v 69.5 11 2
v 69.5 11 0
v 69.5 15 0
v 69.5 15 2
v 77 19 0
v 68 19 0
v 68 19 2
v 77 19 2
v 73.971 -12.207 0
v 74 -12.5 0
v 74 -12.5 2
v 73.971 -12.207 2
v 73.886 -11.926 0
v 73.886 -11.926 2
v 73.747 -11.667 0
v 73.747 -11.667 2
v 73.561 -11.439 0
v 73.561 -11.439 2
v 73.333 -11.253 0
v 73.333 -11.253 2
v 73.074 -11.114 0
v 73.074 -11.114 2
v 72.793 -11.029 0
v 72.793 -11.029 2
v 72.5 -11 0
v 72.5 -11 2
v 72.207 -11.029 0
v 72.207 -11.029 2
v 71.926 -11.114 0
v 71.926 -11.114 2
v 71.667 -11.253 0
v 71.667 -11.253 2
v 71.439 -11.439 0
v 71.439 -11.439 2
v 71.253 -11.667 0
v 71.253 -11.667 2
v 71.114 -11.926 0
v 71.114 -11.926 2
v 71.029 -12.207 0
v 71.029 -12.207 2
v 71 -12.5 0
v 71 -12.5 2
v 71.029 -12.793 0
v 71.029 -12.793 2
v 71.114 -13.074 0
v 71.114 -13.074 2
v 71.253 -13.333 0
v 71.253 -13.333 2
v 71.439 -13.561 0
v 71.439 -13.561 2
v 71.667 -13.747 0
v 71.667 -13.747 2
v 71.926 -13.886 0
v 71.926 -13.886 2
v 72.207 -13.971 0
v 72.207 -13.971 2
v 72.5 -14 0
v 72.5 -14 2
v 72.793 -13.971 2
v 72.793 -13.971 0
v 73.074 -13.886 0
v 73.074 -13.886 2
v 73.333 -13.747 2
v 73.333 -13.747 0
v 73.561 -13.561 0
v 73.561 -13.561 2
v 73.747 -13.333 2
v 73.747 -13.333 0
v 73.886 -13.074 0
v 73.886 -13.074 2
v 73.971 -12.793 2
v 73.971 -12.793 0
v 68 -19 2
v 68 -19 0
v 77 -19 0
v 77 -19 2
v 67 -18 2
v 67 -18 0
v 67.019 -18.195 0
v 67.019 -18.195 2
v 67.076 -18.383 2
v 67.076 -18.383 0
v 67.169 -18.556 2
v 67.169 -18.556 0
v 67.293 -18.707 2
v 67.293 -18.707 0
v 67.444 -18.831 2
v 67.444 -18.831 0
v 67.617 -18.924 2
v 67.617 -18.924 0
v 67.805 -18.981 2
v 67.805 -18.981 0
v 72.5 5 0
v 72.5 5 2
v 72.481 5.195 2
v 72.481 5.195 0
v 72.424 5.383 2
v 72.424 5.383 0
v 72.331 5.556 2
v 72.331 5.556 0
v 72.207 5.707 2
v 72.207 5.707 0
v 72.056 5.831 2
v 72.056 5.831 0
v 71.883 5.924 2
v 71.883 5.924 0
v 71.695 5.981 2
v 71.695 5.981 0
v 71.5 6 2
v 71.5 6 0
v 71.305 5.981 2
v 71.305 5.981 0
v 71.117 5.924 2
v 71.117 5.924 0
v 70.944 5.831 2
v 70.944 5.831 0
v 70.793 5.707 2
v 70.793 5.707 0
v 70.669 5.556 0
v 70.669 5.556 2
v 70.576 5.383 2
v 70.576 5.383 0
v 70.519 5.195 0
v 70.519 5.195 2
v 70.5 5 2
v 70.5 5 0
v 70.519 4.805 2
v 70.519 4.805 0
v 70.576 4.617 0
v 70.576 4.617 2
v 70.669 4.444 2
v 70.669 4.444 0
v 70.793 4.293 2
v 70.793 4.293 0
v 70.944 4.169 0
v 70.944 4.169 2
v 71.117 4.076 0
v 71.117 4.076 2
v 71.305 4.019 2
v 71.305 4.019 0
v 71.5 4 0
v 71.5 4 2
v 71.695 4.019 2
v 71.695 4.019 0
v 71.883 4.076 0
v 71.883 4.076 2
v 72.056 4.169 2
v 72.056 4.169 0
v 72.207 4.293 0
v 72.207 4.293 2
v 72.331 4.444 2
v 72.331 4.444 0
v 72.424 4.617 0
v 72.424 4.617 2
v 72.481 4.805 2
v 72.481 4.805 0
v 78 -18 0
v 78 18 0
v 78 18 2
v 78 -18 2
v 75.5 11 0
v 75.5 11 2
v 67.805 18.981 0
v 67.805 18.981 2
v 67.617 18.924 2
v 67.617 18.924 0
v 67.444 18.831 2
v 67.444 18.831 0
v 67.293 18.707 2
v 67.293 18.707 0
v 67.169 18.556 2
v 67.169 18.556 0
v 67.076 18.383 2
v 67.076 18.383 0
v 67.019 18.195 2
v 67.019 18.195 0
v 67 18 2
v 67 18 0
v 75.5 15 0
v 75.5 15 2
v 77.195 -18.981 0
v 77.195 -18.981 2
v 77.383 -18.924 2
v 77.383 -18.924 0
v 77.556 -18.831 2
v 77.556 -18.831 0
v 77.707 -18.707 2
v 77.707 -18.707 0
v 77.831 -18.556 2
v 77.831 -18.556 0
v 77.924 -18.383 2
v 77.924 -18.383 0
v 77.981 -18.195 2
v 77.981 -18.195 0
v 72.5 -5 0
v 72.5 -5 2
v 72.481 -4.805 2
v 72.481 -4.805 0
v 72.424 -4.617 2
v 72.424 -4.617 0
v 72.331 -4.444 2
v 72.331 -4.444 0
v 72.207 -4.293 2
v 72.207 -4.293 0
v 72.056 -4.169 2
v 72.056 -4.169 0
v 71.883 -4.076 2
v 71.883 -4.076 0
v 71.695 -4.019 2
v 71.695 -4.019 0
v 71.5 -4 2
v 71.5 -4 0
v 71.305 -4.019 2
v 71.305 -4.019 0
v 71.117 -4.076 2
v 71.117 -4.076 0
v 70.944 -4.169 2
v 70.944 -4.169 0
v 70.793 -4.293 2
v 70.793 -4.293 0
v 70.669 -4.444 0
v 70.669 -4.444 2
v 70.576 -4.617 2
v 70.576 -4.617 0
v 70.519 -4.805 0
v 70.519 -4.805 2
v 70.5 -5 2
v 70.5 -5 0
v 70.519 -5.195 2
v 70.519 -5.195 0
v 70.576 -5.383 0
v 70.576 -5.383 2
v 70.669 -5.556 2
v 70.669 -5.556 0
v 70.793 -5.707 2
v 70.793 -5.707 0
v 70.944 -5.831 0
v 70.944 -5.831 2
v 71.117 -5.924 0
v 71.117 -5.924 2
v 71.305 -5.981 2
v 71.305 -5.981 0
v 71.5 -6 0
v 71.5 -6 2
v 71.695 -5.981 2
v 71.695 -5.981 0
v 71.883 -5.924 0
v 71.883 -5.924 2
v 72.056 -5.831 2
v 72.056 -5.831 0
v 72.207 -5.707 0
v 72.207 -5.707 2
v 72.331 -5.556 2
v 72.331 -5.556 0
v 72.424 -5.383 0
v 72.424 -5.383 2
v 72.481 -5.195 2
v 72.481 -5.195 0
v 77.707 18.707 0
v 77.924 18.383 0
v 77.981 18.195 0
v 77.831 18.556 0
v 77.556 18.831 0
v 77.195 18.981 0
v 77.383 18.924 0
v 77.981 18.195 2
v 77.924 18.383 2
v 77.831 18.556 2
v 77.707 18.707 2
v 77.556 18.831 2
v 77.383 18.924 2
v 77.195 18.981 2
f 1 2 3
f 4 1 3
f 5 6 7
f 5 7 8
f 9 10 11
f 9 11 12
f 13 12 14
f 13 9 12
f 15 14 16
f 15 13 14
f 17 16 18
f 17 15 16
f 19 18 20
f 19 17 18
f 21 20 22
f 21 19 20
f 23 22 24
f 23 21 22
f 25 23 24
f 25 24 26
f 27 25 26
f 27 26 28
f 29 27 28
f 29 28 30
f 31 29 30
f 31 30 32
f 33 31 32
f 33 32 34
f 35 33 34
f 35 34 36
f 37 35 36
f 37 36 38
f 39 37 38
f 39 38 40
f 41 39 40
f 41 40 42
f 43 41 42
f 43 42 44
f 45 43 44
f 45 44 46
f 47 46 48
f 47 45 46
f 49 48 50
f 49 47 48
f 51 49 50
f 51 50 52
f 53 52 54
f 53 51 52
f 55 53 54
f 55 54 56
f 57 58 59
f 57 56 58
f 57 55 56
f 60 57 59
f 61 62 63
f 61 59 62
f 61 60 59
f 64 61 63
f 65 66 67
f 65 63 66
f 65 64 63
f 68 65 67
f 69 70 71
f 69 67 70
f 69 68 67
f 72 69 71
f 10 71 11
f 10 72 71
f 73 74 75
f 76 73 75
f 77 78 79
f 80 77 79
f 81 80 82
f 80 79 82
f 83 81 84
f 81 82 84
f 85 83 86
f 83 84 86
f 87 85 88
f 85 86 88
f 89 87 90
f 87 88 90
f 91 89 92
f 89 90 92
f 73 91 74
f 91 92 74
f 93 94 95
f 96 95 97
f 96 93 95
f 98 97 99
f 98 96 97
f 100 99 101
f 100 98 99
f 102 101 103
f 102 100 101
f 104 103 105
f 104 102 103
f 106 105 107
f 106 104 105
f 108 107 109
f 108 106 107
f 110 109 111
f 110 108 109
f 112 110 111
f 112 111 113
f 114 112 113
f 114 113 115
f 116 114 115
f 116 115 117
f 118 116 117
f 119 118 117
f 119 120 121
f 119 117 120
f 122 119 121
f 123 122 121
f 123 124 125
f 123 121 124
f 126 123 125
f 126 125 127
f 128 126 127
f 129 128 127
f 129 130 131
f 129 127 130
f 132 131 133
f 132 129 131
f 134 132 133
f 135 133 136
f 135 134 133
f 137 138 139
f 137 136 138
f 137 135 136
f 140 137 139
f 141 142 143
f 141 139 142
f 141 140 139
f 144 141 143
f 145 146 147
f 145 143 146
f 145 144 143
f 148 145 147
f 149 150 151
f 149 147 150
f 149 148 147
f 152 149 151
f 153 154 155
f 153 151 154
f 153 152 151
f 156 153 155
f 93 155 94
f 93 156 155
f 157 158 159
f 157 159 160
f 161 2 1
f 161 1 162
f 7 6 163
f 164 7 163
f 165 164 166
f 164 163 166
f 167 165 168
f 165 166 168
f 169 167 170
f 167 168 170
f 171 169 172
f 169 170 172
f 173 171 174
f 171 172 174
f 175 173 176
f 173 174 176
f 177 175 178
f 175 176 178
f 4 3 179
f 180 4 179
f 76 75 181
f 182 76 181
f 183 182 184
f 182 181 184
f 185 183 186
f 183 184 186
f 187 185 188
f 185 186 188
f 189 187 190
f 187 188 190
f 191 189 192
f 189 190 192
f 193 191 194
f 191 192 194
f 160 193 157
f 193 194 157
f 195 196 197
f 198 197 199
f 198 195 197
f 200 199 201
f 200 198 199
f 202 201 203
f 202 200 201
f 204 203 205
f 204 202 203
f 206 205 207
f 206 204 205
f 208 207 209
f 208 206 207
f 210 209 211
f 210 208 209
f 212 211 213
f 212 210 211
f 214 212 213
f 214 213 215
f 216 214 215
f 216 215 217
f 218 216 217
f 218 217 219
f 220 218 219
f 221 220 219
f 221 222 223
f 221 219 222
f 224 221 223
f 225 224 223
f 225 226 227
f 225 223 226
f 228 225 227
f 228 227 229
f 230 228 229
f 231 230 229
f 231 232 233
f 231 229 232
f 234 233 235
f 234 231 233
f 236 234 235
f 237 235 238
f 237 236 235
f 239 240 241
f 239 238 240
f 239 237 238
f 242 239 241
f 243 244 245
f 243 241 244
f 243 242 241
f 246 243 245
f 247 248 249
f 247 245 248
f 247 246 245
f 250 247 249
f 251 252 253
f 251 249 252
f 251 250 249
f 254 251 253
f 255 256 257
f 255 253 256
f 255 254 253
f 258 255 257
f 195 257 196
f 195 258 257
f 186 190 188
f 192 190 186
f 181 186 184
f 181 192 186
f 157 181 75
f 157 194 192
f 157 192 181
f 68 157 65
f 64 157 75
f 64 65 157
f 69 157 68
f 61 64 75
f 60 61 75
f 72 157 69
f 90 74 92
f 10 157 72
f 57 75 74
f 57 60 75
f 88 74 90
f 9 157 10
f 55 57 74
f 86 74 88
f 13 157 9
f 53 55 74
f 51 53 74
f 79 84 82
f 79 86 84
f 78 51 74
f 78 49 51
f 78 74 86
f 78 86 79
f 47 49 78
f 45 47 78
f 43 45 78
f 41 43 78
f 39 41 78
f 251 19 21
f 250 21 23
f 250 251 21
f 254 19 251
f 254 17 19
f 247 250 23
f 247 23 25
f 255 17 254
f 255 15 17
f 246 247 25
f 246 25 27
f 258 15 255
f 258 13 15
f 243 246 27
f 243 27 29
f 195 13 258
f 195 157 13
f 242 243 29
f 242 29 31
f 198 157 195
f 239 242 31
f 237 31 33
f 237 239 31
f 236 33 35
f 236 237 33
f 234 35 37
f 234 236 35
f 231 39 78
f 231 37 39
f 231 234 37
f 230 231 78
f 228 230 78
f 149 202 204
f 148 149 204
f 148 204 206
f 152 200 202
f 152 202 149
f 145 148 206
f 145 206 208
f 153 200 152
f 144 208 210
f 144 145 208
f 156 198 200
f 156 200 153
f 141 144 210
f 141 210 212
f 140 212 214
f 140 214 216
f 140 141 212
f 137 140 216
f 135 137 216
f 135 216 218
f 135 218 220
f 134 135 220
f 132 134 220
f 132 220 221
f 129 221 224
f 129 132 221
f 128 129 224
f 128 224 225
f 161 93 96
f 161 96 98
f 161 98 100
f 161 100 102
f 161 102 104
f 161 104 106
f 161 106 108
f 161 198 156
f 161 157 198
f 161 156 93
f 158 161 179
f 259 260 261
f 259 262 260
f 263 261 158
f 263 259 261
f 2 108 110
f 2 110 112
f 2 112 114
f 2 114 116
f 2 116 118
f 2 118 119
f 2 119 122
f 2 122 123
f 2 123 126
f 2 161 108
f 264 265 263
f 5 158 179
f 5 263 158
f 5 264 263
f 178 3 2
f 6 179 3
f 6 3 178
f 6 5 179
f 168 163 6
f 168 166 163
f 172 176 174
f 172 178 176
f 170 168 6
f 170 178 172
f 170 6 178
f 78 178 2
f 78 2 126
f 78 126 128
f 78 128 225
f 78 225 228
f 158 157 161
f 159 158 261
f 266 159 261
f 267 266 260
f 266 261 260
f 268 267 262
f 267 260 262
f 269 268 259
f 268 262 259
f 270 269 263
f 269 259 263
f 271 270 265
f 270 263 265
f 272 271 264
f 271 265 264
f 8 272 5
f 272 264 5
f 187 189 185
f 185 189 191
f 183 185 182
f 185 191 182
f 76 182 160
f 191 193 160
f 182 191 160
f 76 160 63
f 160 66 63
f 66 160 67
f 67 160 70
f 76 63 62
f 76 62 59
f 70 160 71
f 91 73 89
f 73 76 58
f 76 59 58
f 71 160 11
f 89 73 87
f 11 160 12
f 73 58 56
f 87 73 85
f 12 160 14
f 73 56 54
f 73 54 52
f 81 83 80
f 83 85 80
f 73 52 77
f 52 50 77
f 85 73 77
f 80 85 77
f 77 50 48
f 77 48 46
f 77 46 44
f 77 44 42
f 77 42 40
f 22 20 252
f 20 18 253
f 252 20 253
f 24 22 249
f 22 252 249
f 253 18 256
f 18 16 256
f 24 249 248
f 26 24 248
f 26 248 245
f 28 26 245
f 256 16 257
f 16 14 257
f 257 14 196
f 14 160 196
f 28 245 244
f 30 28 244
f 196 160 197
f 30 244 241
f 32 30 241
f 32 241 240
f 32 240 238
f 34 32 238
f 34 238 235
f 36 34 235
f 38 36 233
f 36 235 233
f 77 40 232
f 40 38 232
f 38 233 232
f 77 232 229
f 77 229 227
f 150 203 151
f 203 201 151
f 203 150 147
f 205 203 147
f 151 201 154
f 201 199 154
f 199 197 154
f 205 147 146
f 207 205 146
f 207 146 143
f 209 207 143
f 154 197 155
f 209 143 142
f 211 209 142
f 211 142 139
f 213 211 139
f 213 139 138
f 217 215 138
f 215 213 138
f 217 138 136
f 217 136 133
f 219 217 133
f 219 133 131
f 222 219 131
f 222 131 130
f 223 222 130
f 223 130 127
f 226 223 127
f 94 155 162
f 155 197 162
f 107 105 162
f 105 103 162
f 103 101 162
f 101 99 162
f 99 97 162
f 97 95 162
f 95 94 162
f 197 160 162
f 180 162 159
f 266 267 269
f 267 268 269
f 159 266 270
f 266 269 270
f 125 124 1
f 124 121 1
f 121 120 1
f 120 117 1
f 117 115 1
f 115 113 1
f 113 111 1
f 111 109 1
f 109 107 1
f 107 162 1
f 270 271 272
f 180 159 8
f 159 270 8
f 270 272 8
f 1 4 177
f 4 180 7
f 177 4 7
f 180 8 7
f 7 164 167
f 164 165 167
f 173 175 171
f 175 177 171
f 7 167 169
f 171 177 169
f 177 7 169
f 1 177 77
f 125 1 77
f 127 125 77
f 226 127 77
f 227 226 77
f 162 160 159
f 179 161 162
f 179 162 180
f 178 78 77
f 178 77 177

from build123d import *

# Parameters (mm, degrees)
SKETCH324_R      = 1.5
EXTRUDE192_DEPTH = 10
SKETCH321_W      = 6
SKETCH321_H      = 4
EXTRUDE189_DEPTH = 3
SKETCH319_R      = 1
EXTRUDE187_DEPTH = 5
EXTRUDE188_DEPTH = 2


with BuildPart() as extrude192:
    # Sketch324 → Extrude192 (new body)
    with BuildSketch(Plane.XY.offset(-2)):
        with Locations((72.5, -12.5)):
            Circle(SKETCH324_R)
    extrude(amount=EXTRUDE192_DEPTH)


with BuildPart() as extrude189:
    # Sketch321 → Extrude189 (new body)
    with BuildSketch(Plane.XY.offset(3)):
        with Locations((72.5, 13)):
            Rectangle(SKETCH321_W, SKETCH321_H)
    extrude(amount=EXTRUDE189_DEPTH)


with BuildPart() as extrude187:
    # Sketch319 → Extrude187 (new body)
    with BuildSketch(Plane.XY.offset(3)):
        with Locations((71.5, 5)):
            Circle(SKETCH319_R)
        with Locations((71.5, -5)):
            Circle(SKETCH319_R)
    extrude(amount=EXTRUDE187_DEPTH)


with BuildPart() as frontsensoricsrig:
    # Sketch318 → Extrude188 (new body)
    with BuildSketch(Plane.XY.offset(3)):
        with BuildLine():
            Line((67, -18), (67, 18))
            ThreePointArc((68, 19), (67.292893, 18.707107), (67, 18))
            Line((68, 19), (77, 19))
            ThreePointArc((78, 18), (77.707107, 18.707107), (77, 19))
            Line((78, 18), (78, -18))
            ThreePointArc((77, -19), (77.707107, -18.707107), (78, -18))
            Line((68, -19), (77, -19))
            ThreePointArc((67, -18), (67.292893, -18.707107), (68, -19))
        make_face()
    extrude(amount=EXTRUDE188_DEPTH)

    # Cut098: cut Extrude187
    add(extrude187.part, mode=Mode.SUBTRACT)

    # Cut099: cut Extrude189
    add(extrude189.part, mode=Mode.SUBTRACT)


with BuildPart() as frontsensoricsrig_1:
    # Cut099 placement: moved
    add(frontsensoricsrig.part.moved(Location((0, 0, -3))))

    # Cut102: cut Extrude192
    add(extrude192.part, mode=Mode.SUBTRACT)


solid = frontsensoricsrig_1.part
